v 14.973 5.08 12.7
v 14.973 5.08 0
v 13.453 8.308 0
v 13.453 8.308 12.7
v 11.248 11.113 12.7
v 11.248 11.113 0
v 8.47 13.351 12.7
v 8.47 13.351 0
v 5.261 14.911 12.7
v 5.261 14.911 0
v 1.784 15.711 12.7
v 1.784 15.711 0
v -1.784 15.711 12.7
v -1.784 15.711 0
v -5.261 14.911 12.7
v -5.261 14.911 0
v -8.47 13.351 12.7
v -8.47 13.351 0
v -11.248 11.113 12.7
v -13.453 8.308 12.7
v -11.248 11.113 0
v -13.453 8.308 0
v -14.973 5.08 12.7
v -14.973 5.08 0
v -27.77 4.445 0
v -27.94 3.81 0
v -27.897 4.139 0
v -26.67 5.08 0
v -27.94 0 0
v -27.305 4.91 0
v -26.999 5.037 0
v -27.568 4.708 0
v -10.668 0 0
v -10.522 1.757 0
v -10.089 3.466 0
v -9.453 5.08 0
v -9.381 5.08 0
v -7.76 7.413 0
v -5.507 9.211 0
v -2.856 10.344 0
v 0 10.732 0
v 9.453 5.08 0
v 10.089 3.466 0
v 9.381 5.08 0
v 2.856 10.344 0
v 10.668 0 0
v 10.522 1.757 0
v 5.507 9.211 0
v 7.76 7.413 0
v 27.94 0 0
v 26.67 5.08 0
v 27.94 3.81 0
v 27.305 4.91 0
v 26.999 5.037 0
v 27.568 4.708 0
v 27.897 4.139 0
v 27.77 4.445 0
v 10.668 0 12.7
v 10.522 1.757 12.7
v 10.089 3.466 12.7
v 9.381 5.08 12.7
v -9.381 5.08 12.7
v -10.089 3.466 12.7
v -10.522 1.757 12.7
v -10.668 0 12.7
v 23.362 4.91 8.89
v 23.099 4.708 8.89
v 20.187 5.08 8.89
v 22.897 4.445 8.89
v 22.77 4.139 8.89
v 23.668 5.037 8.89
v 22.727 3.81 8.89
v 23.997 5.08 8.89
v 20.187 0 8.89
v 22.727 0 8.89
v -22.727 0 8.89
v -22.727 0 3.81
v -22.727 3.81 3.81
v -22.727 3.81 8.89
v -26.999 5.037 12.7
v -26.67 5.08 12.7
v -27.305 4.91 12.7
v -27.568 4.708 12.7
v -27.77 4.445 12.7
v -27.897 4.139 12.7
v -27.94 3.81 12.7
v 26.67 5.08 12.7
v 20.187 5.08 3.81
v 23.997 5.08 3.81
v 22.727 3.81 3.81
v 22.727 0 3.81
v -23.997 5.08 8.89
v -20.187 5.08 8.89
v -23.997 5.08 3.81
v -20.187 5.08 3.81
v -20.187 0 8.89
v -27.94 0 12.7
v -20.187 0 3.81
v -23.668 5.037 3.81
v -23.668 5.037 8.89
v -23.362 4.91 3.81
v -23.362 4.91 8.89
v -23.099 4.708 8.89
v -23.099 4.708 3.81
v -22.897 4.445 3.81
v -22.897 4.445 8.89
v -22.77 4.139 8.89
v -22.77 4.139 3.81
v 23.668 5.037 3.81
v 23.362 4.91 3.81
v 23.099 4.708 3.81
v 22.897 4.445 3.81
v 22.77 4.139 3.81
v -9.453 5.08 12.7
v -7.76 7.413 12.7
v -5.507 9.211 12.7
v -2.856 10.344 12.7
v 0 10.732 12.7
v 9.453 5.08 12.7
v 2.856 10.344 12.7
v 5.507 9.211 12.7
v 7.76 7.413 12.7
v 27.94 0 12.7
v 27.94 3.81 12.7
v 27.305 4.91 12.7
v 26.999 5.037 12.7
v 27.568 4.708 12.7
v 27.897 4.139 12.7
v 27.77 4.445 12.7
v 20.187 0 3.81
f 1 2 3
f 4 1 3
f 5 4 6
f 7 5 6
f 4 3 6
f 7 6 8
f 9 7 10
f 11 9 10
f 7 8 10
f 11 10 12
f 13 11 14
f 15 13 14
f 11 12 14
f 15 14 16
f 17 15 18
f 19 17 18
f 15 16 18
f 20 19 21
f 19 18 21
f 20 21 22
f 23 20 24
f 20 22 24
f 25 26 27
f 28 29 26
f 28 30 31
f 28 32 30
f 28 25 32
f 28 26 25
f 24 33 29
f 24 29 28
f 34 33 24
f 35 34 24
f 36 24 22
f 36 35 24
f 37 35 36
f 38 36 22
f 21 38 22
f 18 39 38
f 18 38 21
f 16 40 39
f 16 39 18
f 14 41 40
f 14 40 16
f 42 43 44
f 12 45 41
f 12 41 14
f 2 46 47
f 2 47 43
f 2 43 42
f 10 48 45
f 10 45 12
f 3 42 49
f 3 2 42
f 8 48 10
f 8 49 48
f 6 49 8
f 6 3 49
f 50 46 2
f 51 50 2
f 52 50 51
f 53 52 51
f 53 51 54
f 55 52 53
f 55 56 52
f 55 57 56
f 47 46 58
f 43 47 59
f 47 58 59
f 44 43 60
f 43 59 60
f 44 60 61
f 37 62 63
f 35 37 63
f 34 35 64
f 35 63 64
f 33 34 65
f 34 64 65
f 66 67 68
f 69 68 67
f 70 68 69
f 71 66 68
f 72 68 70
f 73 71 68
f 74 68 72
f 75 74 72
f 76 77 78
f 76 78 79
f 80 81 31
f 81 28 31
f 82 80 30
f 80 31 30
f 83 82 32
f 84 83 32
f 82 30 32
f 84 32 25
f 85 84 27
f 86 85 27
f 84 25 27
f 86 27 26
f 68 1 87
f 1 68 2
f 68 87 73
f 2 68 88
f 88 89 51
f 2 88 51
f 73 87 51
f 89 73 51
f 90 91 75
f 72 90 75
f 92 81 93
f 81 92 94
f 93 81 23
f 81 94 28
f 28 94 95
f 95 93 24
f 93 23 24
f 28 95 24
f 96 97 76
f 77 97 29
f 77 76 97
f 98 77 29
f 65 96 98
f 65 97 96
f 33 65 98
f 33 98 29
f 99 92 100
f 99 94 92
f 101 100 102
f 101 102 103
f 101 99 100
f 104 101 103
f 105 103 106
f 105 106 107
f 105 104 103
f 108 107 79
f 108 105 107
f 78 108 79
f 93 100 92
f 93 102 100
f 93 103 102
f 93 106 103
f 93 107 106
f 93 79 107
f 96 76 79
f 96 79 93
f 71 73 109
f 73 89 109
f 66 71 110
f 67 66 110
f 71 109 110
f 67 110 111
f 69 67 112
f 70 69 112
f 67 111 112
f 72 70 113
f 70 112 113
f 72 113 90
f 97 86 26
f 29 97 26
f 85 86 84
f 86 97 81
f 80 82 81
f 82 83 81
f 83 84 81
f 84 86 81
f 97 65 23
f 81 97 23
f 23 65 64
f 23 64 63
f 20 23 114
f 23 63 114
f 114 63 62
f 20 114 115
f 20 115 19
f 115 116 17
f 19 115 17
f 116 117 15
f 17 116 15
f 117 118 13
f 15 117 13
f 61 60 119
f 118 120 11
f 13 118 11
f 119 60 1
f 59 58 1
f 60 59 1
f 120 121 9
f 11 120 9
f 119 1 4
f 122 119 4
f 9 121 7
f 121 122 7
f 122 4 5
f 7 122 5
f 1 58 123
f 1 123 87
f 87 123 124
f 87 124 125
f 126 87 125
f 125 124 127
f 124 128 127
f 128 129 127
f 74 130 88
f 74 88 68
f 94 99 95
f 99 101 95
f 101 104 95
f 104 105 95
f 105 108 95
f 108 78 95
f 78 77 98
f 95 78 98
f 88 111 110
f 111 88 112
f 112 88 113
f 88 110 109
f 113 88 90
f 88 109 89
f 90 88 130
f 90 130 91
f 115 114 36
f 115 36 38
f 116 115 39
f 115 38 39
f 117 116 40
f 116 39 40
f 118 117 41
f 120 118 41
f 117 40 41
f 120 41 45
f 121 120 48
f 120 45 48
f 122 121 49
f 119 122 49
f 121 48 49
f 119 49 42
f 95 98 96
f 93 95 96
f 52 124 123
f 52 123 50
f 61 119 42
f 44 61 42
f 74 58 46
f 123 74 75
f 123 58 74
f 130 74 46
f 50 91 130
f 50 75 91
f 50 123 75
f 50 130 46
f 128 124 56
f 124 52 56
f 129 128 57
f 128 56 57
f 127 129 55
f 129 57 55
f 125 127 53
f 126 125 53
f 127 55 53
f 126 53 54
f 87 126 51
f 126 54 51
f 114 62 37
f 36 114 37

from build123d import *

# Parameters (mm, degrees)
BOSS_EXTRUDE1_DEPTH = 12.7
SKETCH3_W           = 12.7
SKETCH3_H           = 5.08
BOSS_EXTRUDE2_DEPTH = 27.94
SKETCH4_R           = 10.668
CUT_EXTRUDE1_DEPTH  = 44.196
CUT_EXTRUDE3_REACH  = 36.524
SKETCH6_W           = 2.54
SKETCH6_H           = 5.08
FILLET1_R           = 1.27


with BuildPart() as part:
    # Sketch2 → Boss-Extrude1 (new body)
    with BuildSketch(Plane.XY):
        with BuildLine():
            Line((-15.8115, 0), (-10.7315, 0))
            ThreePointArc((-10.7315, 0), (0, 10.7315), (10.7315, 0))
            Line((10.7315, 0), (15.8115, 0))
            ThreePointArc((15.8115, 0), (0, 15.8115), (-15.8115, 0))
        make_face()
    extrude(amount=BOSS_EXTRUDE1_DEPTH)

    # Sketch3 → Boss-Extrude2 (add, symmetric)
    with BuildSketch(Plane(origin=(0, 0, 0), x_dir=(0, 0, -1), z_dir=(1, 0, 0))):
        with Locations((-6.35, 2.54)):
            Rectangle(SKETCH3_W, SKETCH3_H)
    extrude(amount=BOSS_EXTRUDE2_DEPTH, both=True)

    # Sketch4 → Cut-Extrude1 (cut)
    with BuildSketch(Plane.XY.offset(12.7)):
        Circle(SKETCH4_R)
    extrude(amount=-CUT_EXTRUDE1_DEPTH, mode=Mode.SUBTRACT)

    # Sketch6 → Cut-Extrude3 (cut, up to next)
    with BuildSketch(Plane.XZ, mode=Mode.PRIVATE) as cut_extrude3_sk1:
        with Locations((-21.456606913, 6.35)):
            Rectangle(SKETCH6_W, SKETCH6_H)
    cut_extrude3_tool1 = extrude(cut_extrude3_sk1.sketch, amount=-CUT_EXTRUDE3_REACH, mode=Mode.PRIVATE) & part.part
    # Sketch6 → Cut-Extrude3 (cut, up to next)
    with BuildSketch(Plane.XZ, mode=Mode.PRIVATE) as cut_extrude3_sk2:
        with Locations((21.456606913, 6.35)):
            Rectangle(SKETCH6_W, SKETCH6_H)
    cut_extrude3_tool2 = extrude(cut_extrude3_sk2.sketch, amount=-CUT_EXTRUDE3_REACH, mode=Mode.PRIVATE) & part.part
    add(cut_extrude3_tool1.solids().sort_by_distance((-21.456607, 0, 6.35))[0], mode=Mode.SUBTRACT)
    add(cut_extrude3_tool2.solids().sort_by_distance((21.456607, 0, 6.35))[0], mode=Mode.SUBTRACT)

    # Fillet1
    fillet1_edges = [part.edges().sort_by_distance(p)[0] for p in [
        (-27.94, 5.08, 6.35),
        (27.94, 5.08, 6.35),
        (-22.726606913, 5.08, 6.35),
        (22.726606913, 5.08, 6.35),
    ]]
    fillet(fillet1_edges, radius=FILLET1_R)


solid = part.part
